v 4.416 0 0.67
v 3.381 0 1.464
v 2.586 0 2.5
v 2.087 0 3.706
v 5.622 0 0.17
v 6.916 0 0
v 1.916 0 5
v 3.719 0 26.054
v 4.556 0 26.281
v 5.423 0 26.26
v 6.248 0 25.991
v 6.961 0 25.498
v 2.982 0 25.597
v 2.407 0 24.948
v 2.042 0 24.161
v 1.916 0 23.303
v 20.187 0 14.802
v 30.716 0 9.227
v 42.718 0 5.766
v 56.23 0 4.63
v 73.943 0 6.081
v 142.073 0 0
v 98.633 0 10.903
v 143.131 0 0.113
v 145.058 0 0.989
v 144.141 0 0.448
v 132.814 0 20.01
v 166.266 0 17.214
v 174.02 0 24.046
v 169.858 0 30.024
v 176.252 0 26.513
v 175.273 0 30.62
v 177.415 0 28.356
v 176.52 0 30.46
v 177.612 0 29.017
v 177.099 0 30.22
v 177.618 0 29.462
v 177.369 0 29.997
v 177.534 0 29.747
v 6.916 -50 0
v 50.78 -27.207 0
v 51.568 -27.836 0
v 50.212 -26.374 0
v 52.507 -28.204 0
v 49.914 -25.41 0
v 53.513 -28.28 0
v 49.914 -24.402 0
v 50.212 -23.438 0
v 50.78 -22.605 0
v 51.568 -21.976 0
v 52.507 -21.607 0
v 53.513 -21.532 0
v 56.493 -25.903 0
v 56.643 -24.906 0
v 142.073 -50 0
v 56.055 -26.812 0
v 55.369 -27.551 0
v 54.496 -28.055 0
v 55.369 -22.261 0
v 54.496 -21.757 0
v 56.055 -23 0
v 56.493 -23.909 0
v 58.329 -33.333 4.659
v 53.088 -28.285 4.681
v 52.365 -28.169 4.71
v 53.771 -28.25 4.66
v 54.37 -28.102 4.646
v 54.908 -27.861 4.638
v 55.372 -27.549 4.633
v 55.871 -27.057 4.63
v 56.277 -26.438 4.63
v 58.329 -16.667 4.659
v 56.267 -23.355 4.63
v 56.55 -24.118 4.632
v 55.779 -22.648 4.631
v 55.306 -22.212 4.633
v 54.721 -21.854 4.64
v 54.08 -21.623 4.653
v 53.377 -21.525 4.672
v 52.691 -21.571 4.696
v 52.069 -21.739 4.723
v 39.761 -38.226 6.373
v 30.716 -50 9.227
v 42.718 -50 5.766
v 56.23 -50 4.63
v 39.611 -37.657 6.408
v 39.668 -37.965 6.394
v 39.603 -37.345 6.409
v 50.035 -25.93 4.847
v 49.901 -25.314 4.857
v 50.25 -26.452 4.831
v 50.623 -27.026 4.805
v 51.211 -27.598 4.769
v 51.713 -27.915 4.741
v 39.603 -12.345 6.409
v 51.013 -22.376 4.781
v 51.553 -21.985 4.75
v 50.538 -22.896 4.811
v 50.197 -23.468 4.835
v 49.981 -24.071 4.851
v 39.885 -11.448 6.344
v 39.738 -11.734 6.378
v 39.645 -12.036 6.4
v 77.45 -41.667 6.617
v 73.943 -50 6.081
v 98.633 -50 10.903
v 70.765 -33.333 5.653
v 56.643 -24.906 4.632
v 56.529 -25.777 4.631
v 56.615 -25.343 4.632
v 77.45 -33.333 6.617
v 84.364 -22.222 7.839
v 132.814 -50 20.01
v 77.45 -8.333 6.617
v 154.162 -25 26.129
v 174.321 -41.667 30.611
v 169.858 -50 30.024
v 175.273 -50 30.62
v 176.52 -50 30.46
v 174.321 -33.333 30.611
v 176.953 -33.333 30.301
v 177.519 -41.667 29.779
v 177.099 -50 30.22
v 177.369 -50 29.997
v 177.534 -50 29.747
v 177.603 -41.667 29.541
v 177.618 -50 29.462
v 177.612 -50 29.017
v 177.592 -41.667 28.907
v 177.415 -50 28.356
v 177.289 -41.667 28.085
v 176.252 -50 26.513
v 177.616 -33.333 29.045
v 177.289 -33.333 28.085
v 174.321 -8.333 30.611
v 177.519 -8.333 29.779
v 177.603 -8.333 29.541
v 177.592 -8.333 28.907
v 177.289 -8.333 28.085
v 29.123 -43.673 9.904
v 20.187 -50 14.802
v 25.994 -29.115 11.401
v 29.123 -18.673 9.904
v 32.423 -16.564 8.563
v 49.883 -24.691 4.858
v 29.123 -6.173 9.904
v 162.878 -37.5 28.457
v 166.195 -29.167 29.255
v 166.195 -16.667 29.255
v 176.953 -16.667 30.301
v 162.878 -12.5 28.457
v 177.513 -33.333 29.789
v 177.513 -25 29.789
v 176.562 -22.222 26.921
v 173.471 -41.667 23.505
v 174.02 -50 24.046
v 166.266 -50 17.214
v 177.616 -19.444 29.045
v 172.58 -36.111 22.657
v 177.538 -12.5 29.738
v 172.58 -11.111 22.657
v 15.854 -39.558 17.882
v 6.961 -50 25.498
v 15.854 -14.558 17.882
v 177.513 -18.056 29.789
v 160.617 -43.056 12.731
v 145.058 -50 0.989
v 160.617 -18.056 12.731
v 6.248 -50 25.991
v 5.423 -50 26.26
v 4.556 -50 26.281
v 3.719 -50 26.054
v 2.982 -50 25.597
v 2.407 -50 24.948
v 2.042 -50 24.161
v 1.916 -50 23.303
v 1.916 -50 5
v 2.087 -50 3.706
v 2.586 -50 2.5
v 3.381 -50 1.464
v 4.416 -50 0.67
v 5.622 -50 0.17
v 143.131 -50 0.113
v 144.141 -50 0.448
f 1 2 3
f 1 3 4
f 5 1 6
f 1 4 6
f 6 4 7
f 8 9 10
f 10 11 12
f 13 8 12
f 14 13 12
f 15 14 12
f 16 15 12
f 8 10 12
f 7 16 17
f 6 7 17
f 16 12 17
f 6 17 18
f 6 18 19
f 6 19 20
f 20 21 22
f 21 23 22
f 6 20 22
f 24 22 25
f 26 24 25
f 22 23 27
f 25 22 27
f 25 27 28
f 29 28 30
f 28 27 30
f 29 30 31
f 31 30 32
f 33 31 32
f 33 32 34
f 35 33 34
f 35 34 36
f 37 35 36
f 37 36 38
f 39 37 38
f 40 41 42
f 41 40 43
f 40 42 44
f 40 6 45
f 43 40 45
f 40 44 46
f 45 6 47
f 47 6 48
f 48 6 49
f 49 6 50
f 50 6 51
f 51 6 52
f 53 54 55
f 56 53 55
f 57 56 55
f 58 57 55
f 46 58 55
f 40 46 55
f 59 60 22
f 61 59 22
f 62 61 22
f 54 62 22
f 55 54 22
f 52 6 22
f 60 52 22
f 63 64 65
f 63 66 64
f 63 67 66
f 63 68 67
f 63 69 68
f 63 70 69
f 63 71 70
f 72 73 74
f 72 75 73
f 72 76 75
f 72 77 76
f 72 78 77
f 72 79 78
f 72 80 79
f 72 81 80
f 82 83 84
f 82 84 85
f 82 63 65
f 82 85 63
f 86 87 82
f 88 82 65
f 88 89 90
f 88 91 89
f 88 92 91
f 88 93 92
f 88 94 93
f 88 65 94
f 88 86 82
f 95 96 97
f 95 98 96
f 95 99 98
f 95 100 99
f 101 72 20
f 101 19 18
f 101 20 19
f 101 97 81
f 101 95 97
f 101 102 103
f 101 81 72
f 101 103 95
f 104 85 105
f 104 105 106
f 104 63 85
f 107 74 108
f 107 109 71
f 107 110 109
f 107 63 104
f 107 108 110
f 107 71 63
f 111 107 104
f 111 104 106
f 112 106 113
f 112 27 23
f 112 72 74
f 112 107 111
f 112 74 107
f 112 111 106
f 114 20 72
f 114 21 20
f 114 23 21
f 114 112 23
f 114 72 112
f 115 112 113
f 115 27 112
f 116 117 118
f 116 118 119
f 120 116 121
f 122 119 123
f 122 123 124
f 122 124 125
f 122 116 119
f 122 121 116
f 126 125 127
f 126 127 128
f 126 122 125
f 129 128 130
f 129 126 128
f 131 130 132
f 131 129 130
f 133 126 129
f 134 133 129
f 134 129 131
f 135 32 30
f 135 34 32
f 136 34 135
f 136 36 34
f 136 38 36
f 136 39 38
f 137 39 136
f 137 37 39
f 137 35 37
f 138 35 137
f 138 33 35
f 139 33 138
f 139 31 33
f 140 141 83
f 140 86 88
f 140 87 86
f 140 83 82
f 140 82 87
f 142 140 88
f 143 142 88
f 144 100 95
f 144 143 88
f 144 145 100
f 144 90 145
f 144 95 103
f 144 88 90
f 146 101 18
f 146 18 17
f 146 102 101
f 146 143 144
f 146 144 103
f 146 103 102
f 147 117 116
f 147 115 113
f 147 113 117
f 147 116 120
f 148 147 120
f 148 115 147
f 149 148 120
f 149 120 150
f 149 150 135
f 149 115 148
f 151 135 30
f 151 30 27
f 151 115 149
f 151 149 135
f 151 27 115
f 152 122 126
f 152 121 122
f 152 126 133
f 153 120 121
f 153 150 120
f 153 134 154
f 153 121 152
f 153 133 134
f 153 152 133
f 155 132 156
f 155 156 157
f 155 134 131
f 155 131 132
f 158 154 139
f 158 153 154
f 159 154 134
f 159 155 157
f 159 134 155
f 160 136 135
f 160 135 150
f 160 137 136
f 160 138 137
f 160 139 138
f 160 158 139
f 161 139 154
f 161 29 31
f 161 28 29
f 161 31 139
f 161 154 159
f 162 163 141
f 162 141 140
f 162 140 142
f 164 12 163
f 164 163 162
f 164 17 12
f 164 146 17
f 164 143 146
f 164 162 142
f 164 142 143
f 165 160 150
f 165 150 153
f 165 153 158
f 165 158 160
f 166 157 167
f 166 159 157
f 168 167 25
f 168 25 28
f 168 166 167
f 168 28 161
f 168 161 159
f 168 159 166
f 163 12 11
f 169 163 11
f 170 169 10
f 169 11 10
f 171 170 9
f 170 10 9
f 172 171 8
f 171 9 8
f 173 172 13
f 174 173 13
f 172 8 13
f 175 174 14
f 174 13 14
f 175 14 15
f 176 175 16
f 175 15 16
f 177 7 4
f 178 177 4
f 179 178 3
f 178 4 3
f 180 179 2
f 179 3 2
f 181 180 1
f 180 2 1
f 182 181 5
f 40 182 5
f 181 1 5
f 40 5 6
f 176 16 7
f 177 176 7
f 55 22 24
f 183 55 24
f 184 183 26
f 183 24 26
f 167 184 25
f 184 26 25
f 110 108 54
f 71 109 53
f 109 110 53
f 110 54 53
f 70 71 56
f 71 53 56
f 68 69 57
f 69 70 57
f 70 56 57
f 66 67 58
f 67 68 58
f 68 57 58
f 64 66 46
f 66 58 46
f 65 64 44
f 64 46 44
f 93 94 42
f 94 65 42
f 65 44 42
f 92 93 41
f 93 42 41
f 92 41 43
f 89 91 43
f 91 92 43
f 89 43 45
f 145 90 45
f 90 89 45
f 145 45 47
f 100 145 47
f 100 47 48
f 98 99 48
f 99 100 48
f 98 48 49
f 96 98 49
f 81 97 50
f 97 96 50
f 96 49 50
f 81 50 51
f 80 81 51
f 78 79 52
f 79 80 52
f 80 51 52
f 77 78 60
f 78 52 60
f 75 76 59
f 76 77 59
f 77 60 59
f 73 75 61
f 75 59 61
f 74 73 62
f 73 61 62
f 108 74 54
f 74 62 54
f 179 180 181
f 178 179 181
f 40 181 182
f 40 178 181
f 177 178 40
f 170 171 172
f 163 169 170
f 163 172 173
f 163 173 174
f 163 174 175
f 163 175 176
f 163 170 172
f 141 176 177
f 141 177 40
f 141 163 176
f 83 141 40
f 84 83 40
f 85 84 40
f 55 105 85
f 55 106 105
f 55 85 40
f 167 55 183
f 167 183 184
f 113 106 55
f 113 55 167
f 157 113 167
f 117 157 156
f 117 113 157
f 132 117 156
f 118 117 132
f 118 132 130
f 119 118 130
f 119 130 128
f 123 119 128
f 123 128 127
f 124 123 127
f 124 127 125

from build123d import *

# Parameters (mm, degrees)
F0_W     = 180
F0_H     = 30
F1_DEPTH = 50
F3_DEPTH = 50
F5_R     = 3.383292764
F6_DEPTH = 25


with BuildPart() as f1:
    # F0 (on Front) → F1 (new body)
    with BuildSketch(Plane.XZ):
        with Locations((90, 15)):
            Rectangle(F0_W, F0_H)
    extrude(amount=F1_DEPTH)


with BuildPart() as f3:
    # F2 (on Front) → F3 (new body, through all)
    with BuildSketch(Plane.XZ):
        with BuildLine():
            ThreePointArc((1.9161681412, 5), (3.3806342352, 1.4644660941), (6.9161681412, 0))
            Line((6.9161681412, 0), (142.0731289296, 0))
            ThreePointArc((142.0731289296, 0), (143.6453106538, 0.2536071985), (145.0580057369, 0.9887021495))
            add(Edge.make_bspline(
                [(6.9612407783, 25.4980860864), (19.1897035579, 14.1044662842), (54.6478549175, -12.055462272), (211.476752324, 50.7476026056), (163.4766085339, 14.6943062607), (145.0580057369, 0.9887021495)],
                knots=[0.0375443609, 0.0375443609, 0.0375443609, 0.0375443609, 0.3075680716, 0.7379988926, 0.9938496703, 0.9938496703, 0.9938496703, 0.9938496703], degree=3))
            ThreePointArc((6.9612407783, 25.4980860864), (3.7193427386, 26.0540938961), (1.9161681412, 23.3031651519))
            Line((1.9161681412, 23.3031651519), (1.9161681412, 5))
        make_face()
    extrude(amount=F3_DEPTH)

    # F5 (on face) → F6 (cut)
    with BuildSketch(Plane(origin=(0, 0, 0), x_dir=(1, 0, 0), z_dir=(0, 0, -1))):
        with Locations((53.2598085701, 24.9059256166)):
            Circle(F5_R)
    extrude(amount=-F6_DEPTH, mode=Mode.SUBTRACT)


solid = f3.part
